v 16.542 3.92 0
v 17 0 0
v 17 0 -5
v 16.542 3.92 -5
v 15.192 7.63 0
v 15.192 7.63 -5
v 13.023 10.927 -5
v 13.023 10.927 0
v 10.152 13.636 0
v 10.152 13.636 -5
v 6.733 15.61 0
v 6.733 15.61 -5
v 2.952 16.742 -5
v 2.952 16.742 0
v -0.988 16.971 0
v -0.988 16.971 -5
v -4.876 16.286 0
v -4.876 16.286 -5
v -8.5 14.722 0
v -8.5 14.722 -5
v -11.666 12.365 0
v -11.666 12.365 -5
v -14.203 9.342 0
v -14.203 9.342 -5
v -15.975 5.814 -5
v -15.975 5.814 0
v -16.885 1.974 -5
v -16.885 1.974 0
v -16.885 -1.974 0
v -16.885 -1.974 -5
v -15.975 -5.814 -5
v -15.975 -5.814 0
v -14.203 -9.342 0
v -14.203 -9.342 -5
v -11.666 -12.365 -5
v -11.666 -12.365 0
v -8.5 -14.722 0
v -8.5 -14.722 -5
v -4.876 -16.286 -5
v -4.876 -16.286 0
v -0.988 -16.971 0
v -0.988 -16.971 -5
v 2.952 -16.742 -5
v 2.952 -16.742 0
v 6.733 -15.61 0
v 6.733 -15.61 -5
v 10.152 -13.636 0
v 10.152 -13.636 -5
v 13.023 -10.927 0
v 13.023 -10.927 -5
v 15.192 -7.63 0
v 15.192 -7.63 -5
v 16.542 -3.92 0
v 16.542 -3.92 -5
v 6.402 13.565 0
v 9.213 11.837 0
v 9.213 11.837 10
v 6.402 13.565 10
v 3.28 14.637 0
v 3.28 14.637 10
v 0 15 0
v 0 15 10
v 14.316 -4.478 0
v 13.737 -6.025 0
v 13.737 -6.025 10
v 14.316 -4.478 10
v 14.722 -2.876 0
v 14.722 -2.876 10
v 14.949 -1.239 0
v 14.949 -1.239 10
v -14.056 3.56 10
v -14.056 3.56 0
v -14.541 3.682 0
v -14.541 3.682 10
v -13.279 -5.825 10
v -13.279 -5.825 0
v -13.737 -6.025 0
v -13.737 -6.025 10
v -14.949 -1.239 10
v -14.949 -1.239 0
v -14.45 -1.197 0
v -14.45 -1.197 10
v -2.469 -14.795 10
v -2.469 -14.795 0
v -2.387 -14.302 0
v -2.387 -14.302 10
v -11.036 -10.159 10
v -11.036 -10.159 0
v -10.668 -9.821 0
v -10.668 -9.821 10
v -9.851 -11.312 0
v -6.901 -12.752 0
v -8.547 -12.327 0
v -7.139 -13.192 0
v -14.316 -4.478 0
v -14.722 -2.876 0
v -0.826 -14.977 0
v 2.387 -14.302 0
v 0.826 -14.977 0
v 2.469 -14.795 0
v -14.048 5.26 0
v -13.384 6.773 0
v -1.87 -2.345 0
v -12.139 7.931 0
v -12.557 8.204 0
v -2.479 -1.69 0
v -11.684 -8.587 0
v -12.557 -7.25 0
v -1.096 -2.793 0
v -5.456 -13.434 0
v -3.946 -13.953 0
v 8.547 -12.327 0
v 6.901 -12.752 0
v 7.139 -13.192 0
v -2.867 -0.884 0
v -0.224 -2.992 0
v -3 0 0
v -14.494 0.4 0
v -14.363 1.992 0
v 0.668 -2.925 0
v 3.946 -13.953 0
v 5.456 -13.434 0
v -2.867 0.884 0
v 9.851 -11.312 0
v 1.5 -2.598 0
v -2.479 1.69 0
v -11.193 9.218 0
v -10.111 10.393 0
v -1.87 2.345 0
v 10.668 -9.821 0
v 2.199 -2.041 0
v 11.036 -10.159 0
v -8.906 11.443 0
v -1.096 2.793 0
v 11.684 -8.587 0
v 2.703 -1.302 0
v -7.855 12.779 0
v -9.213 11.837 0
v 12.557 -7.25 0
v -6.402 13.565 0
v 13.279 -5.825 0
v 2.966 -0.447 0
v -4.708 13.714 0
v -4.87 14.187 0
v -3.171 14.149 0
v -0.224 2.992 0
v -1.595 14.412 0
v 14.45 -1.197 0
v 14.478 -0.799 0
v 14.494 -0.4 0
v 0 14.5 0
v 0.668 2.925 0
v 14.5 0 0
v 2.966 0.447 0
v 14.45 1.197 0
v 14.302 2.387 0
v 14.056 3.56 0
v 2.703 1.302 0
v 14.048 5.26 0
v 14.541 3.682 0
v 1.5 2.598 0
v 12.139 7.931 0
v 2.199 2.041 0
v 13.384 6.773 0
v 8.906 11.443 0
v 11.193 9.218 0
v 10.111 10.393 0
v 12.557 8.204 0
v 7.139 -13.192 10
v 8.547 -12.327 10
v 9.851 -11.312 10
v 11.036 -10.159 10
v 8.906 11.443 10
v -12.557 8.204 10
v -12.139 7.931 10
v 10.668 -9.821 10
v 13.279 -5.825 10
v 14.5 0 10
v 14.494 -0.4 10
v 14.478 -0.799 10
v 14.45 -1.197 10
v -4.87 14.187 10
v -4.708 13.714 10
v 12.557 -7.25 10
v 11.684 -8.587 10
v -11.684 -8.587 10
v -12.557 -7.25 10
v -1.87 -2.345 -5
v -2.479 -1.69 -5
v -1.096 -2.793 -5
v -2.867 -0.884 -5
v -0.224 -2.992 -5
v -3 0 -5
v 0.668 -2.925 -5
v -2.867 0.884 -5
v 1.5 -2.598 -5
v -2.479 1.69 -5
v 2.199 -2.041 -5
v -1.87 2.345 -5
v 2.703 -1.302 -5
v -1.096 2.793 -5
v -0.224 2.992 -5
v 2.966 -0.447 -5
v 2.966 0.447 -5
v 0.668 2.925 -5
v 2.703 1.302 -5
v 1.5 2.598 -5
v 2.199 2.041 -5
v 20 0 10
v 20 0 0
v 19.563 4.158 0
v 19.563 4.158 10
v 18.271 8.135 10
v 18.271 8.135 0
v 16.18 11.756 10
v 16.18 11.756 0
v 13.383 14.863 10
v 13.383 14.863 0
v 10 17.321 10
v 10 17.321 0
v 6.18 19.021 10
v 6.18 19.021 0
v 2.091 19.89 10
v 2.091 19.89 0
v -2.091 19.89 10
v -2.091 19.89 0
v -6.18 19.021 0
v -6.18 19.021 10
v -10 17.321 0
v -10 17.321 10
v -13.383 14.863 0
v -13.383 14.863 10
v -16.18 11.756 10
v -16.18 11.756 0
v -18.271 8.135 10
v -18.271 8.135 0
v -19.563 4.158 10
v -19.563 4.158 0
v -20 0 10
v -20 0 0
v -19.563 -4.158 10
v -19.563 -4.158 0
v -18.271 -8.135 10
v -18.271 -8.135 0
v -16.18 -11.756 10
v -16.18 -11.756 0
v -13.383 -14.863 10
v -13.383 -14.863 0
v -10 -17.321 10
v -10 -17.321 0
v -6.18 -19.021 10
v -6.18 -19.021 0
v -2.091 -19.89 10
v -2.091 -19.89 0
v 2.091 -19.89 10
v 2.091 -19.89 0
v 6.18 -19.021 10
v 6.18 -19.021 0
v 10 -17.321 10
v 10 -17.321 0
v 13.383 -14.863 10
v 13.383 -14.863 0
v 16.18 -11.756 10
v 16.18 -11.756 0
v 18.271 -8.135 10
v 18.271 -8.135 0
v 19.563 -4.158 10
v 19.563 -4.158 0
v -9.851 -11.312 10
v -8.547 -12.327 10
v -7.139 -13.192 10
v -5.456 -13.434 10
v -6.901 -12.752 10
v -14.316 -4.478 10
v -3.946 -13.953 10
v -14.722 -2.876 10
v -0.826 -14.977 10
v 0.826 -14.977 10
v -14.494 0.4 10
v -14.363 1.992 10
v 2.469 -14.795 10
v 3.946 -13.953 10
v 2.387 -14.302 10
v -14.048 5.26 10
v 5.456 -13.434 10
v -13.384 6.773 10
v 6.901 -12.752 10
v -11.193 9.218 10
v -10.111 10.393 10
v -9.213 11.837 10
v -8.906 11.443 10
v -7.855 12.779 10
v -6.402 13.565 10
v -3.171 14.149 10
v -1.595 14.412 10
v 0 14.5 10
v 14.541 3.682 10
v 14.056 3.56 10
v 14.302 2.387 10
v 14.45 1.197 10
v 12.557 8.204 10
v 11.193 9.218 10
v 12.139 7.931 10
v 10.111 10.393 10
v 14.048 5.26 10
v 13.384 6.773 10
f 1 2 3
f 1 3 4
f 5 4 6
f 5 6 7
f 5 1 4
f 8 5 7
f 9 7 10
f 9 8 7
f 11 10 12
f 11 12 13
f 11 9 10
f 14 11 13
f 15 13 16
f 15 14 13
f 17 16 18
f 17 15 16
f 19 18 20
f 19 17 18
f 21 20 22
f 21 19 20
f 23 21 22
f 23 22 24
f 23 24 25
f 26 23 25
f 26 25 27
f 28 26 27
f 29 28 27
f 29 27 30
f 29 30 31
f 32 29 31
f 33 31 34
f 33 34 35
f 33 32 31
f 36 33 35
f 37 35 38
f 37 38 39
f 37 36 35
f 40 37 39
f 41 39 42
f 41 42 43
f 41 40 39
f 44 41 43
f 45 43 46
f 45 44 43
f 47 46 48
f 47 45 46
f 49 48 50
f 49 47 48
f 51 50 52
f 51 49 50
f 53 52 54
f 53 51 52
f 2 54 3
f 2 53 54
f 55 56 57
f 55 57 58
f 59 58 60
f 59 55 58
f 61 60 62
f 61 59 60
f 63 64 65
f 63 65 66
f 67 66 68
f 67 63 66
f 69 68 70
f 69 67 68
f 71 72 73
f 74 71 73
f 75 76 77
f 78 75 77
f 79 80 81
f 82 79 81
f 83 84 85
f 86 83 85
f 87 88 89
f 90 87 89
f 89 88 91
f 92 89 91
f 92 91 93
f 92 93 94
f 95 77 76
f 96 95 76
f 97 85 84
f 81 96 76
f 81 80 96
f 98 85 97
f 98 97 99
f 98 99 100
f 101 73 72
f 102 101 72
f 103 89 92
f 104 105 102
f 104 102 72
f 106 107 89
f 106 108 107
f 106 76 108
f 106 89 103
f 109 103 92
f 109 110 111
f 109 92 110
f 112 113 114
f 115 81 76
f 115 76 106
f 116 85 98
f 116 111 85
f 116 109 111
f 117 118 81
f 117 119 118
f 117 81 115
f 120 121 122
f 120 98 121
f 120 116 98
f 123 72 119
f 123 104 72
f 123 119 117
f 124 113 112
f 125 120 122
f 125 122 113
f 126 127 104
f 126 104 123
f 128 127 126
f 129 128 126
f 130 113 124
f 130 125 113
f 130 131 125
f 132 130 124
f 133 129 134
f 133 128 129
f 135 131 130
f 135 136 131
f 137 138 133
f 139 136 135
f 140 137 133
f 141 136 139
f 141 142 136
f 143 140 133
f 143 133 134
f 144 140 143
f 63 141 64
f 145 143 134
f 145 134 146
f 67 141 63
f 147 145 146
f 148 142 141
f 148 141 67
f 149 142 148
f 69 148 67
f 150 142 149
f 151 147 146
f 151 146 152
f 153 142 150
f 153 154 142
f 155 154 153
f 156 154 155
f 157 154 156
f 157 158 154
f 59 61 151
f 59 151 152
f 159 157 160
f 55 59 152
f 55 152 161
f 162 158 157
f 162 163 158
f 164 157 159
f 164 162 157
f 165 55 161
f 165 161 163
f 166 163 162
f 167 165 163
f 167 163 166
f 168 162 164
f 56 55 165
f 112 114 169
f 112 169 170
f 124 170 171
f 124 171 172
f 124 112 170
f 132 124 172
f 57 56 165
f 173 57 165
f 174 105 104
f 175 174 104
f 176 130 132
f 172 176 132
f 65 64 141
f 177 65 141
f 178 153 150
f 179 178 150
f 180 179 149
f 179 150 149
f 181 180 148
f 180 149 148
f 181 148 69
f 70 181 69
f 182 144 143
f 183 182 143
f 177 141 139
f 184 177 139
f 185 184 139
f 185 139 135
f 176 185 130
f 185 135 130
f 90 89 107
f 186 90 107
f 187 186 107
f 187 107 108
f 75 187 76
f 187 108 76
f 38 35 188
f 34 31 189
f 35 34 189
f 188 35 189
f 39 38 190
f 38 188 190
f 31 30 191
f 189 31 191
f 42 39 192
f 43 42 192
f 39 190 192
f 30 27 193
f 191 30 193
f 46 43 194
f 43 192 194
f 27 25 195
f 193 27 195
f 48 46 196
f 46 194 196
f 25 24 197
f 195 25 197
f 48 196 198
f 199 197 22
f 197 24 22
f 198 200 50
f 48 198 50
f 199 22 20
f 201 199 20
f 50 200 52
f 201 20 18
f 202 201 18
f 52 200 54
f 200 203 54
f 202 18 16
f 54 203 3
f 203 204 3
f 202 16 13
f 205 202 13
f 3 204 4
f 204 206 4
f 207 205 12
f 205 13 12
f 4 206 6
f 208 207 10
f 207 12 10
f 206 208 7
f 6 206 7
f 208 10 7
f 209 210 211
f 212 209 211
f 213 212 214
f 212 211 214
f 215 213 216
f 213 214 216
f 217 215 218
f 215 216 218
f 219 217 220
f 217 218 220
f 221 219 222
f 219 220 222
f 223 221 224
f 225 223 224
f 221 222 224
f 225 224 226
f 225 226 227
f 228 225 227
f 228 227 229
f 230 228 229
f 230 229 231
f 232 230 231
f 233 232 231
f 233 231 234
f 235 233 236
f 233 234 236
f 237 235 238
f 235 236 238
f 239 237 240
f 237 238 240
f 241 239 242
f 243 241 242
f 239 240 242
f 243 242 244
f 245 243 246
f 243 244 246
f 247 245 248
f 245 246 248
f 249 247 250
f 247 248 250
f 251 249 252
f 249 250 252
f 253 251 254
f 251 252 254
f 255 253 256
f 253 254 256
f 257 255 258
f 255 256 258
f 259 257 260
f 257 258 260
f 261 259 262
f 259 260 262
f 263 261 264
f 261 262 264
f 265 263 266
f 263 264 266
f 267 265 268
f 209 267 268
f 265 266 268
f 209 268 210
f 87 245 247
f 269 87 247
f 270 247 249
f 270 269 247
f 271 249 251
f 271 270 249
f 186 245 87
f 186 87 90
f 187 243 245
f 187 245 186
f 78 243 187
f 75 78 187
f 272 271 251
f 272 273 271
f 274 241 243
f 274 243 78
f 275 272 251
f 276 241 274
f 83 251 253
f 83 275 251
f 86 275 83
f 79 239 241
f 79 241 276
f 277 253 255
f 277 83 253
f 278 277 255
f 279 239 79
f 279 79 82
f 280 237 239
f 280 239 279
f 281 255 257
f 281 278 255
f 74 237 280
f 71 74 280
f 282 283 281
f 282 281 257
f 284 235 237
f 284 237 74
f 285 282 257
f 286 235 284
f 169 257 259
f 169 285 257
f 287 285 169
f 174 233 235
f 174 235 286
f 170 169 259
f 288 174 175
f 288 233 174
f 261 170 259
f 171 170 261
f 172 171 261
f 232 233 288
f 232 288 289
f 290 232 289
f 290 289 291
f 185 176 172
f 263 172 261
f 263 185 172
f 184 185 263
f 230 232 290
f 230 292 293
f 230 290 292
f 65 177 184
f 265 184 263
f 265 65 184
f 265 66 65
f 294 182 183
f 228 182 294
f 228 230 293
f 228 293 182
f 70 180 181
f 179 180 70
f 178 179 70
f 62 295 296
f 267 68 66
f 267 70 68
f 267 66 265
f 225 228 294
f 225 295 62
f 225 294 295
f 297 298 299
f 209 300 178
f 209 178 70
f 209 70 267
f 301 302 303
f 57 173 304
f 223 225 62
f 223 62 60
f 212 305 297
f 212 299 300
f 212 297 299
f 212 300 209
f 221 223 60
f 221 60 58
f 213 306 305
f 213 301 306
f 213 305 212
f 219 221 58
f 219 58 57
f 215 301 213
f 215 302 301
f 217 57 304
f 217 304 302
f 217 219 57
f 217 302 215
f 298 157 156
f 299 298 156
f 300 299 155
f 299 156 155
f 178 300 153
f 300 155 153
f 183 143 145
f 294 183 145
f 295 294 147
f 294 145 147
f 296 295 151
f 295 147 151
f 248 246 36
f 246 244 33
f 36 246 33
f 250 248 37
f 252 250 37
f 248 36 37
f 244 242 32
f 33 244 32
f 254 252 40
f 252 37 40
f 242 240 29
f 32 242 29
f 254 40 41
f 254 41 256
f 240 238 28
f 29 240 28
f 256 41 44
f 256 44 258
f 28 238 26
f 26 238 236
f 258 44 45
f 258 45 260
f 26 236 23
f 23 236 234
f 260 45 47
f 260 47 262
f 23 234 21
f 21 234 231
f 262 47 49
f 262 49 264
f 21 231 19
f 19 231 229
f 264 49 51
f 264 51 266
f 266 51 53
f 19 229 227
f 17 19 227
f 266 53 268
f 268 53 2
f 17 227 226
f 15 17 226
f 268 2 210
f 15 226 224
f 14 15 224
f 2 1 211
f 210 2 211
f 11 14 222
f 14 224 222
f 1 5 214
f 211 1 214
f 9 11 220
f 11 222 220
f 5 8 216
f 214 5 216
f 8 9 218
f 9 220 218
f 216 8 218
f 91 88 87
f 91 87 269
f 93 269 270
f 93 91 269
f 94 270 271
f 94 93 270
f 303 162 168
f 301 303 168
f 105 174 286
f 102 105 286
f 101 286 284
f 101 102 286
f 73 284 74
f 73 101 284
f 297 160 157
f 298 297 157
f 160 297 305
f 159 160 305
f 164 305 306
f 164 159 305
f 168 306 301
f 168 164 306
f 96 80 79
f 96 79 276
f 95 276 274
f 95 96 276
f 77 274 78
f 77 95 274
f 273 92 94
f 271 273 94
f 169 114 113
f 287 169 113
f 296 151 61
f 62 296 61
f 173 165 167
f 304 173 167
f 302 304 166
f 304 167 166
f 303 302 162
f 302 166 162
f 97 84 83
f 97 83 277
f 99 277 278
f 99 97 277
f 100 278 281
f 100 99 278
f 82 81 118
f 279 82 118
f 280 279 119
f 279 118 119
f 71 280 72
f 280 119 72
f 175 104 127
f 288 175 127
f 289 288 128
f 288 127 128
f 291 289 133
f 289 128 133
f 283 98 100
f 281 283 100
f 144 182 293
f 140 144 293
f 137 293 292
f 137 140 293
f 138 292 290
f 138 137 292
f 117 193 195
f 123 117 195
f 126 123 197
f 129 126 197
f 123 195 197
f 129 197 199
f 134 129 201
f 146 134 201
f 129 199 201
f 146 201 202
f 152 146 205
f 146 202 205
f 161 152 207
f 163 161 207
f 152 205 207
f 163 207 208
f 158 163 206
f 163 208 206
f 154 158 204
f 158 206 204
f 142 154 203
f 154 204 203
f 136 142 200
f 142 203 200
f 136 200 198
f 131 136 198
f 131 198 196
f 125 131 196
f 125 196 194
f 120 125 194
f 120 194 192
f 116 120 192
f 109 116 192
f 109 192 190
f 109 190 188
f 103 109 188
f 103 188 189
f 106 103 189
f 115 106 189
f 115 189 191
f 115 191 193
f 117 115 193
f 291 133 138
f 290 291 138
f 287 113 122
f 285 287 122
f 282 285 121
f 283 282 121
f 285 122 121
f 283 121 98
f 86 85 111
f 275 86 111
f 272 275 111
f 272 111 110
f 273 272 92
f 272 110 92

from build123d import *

# Parameters (mm, degrees)
SKETCH1_R           = 20
SKETCH1_R_2         = 15
BOSS_EXTRUDE2_DEPTH = 10
SKETCH2_R           = 17
BOSS_EXTRUDE4_DEPTH = 5
SKETCH5_R           = 3
CUT_EXTRUDE2_DEPTH  = 33.015621187


with BuildPart() as part:
    # Sketch1 → Boss-Extrude2 (new body)
    # profile 1 of 10: a face of its own
    with BuildSketch(Plane.XY):
        Circle(SKETCH1_R)
        Circle(SKETCH1_R_2, mode=Mode.SUBTRACT)
    # profile 2 of 10: a face of its own
    with BuildSketch(Plane.XY):
        with BuildLine():
            ThreePointArc((-4.708142303, 13.714350005), (-2.386621559, 14.302238899), (0, 14.5))
            Line((0, 14.5), (0, 15))
            ThreePointArc((0, 15), (-2.468918854, 14.795419551), (-4.870492038, 14.187258626))
            Line((-4.870492038, 14.187258626), (-4.708142303, 13.714350005))
        make_face()
    # profile 3 of 10: a face of its own
    with BuildSketch(Plane.XY):
        with BuildLine():
            Line((9.21319069, 11.837107641), (8.906084334, 11.442537386))
            ThreePointArc((8.906084334, 11.442537386), (10.667996705, 9.820582789), (12.138913935, 7.930748293))
            Line((12.138913935, 7.930748293), (12.557497174, 8.204222372))
            ThreePointArc((12.557497174, 8.204222372), (11.03585866, 10.159223574), (9.21319069, 11.837107641))
        make_face()
    # profile 4 of 10: a face of its own
    with BuildSketch(Plane.XY):
        with BuildLine():
            Line((14.541003989, 3.682282307), (14.056303856, 3.559539564))
            ThreePointArc((14.056303856, 3.559539564), (14.388648406, 1.793543153), (14.5, 0))
            ThreePointArc((14.5, 0), (14.487613497, -0.599212127), (14.450475149, -1.197400509))
            Line((14.450475149, -1.197400509), (14.948767395, -1.238690182))
            ThreePointArc((14.948767395, -1.238690182), (14.987186376, -0.619874614), (15, 0))
            ThreePointArc((15, 0), (14.884808696, 1.855389469), (14.541003989, 3.682282307))
        make_face()
    # profile 5 of 10: a face of its own
    with BuildSketch(Plane.XY):
        with BuildLine():
            Line((13.7365999, -6.02543137), (13.278713236, -5.824583657))
            ThreePointArc((13.278713236, -5.824583657), (12.138913935, -7.930748293), (10.667996705, -9.820582789))
            Line((10.667996705, -9.820582789), (11.03585866, -10.159223574))
            ThreePointArc((11.03585866, -10.159223574), (12.557497174, -8.204222372), (13.7365999, -6.02543137))
        make_face()
    # profile 6 of 10: a face of its own
    with BuildSketch(Plane.XY):
        with BuildLine():
            Line((7.139210896, -13.192106268), (6.901237199, -12.752369392))
            ThreePointArc((6.901237199, -12.752369392), (4.708142303, -13.714350005), (2.386621559, -14.302238899))
            Line((2.386621559, -14.302238899), (2.468918854, -14.795419551))
            ThreePointArc((2.468918854, -14.795419551), (4.870492038, -14.187258626), (7.139210896, -13.192106268))
        make_face()
    # profile 7 of 10: a face of its own
    with BuildSketch(Plane.XY):
        with BuildLine():
            Line((-2.468918854, -14.795419551), (-2.386621559, -14.302238899))
            ThreePointArc((-2.386621559, -14.302238899), (-4.708142303, -13.714350005), (-6.901237199, -12.752369392))
            Line((-6.901237199, -12.752369392), (-7.139210896, -13.192106268))
            ThreePointArc((-7.139210896, -13.192106268), (-4.870492038, -14.187258626), (-2.468918854, -14.795419551))
        make_face()
    # profile 8 of 10: a face of its own
    with BuildSketch(Plane.XY):
        with BuildLine():
            Line((-11.03585866, -10.159223574), (-10.667996705, -9.820582789))
            ThreePointArc((-10.667996705, -9.820582789), (-12.138913935, -7.930748293), (-13.278713236, -5.824583657))
            Line((-13.278713236, -5.824583657), (-13.7365999, -6.02543137))
            ThreePointArc((-13.7365999, -6.02543137), (-12.557497174, -8.204222372), (-11.03585866, -10.159223574))
        make_face()
    # profile 9 of 10: a face of its own
    with BuildSketch(Plane.XY):
        with BuildLine():
            Line((-14.948767395, -1.238690182), (-14.450475149, -1.197400509))
            ThreePointArc((-14.450475149, -1.197400509), (-14.450475149, 1.197400509), (-14.056303856, 3.559539564))
            Line((-14.056303856, 3.559539564), (-14.541003989, 3.682282307))
            ThreePointArc((-14.541003989, 3.682282307), (-14.948767395, 1.238690182), (-14.948767395, -1.238690182))
        make_face()
    # profile 10 of 10: a face of its own
    with BuildSketch(Plane.XY):
        with BuildLine():
            Line((-12.557497174, 8.204222372), (-12.138913935, 7.930748293))
            ThreePointArc((-12.138913935, 7.930748293), (-10.667996705, 9.820582789), (-8.906084334, 11.442537386))
            Line((-8.906084334, 11.442537386), (-9.21319069, 11.837107641))
            ThreePointArc((-9.21319069, 11.837107641), (-11.03585866, 10.159223574), (-12.557497174, 8.204222372))
        make_face()
    extrude(amount=BOSS_EXTRUDE2_DEPTH)

    # Sketch2 → Boss-Extrude4 (add)
    with BuildSketch(Plane.XY):
        Circle(SKETCH2_R)
    extrude(amount=-BOSS_EXTRUDE4_DEPTH)

    # Sketch5 → Cut-Extrude2 (cut, through all)
    with BuildSketch(Plane(origin=(0, 0, -5), x_dir=(-1, 0, 0), z_dir=(0, 0, -1))):
        Circle(SKETCH5_R)
    extrude(amount=-CUT_EXTRUDE2_DEPTH, mode=Mode.SUBTRACT)


solid = part.part
